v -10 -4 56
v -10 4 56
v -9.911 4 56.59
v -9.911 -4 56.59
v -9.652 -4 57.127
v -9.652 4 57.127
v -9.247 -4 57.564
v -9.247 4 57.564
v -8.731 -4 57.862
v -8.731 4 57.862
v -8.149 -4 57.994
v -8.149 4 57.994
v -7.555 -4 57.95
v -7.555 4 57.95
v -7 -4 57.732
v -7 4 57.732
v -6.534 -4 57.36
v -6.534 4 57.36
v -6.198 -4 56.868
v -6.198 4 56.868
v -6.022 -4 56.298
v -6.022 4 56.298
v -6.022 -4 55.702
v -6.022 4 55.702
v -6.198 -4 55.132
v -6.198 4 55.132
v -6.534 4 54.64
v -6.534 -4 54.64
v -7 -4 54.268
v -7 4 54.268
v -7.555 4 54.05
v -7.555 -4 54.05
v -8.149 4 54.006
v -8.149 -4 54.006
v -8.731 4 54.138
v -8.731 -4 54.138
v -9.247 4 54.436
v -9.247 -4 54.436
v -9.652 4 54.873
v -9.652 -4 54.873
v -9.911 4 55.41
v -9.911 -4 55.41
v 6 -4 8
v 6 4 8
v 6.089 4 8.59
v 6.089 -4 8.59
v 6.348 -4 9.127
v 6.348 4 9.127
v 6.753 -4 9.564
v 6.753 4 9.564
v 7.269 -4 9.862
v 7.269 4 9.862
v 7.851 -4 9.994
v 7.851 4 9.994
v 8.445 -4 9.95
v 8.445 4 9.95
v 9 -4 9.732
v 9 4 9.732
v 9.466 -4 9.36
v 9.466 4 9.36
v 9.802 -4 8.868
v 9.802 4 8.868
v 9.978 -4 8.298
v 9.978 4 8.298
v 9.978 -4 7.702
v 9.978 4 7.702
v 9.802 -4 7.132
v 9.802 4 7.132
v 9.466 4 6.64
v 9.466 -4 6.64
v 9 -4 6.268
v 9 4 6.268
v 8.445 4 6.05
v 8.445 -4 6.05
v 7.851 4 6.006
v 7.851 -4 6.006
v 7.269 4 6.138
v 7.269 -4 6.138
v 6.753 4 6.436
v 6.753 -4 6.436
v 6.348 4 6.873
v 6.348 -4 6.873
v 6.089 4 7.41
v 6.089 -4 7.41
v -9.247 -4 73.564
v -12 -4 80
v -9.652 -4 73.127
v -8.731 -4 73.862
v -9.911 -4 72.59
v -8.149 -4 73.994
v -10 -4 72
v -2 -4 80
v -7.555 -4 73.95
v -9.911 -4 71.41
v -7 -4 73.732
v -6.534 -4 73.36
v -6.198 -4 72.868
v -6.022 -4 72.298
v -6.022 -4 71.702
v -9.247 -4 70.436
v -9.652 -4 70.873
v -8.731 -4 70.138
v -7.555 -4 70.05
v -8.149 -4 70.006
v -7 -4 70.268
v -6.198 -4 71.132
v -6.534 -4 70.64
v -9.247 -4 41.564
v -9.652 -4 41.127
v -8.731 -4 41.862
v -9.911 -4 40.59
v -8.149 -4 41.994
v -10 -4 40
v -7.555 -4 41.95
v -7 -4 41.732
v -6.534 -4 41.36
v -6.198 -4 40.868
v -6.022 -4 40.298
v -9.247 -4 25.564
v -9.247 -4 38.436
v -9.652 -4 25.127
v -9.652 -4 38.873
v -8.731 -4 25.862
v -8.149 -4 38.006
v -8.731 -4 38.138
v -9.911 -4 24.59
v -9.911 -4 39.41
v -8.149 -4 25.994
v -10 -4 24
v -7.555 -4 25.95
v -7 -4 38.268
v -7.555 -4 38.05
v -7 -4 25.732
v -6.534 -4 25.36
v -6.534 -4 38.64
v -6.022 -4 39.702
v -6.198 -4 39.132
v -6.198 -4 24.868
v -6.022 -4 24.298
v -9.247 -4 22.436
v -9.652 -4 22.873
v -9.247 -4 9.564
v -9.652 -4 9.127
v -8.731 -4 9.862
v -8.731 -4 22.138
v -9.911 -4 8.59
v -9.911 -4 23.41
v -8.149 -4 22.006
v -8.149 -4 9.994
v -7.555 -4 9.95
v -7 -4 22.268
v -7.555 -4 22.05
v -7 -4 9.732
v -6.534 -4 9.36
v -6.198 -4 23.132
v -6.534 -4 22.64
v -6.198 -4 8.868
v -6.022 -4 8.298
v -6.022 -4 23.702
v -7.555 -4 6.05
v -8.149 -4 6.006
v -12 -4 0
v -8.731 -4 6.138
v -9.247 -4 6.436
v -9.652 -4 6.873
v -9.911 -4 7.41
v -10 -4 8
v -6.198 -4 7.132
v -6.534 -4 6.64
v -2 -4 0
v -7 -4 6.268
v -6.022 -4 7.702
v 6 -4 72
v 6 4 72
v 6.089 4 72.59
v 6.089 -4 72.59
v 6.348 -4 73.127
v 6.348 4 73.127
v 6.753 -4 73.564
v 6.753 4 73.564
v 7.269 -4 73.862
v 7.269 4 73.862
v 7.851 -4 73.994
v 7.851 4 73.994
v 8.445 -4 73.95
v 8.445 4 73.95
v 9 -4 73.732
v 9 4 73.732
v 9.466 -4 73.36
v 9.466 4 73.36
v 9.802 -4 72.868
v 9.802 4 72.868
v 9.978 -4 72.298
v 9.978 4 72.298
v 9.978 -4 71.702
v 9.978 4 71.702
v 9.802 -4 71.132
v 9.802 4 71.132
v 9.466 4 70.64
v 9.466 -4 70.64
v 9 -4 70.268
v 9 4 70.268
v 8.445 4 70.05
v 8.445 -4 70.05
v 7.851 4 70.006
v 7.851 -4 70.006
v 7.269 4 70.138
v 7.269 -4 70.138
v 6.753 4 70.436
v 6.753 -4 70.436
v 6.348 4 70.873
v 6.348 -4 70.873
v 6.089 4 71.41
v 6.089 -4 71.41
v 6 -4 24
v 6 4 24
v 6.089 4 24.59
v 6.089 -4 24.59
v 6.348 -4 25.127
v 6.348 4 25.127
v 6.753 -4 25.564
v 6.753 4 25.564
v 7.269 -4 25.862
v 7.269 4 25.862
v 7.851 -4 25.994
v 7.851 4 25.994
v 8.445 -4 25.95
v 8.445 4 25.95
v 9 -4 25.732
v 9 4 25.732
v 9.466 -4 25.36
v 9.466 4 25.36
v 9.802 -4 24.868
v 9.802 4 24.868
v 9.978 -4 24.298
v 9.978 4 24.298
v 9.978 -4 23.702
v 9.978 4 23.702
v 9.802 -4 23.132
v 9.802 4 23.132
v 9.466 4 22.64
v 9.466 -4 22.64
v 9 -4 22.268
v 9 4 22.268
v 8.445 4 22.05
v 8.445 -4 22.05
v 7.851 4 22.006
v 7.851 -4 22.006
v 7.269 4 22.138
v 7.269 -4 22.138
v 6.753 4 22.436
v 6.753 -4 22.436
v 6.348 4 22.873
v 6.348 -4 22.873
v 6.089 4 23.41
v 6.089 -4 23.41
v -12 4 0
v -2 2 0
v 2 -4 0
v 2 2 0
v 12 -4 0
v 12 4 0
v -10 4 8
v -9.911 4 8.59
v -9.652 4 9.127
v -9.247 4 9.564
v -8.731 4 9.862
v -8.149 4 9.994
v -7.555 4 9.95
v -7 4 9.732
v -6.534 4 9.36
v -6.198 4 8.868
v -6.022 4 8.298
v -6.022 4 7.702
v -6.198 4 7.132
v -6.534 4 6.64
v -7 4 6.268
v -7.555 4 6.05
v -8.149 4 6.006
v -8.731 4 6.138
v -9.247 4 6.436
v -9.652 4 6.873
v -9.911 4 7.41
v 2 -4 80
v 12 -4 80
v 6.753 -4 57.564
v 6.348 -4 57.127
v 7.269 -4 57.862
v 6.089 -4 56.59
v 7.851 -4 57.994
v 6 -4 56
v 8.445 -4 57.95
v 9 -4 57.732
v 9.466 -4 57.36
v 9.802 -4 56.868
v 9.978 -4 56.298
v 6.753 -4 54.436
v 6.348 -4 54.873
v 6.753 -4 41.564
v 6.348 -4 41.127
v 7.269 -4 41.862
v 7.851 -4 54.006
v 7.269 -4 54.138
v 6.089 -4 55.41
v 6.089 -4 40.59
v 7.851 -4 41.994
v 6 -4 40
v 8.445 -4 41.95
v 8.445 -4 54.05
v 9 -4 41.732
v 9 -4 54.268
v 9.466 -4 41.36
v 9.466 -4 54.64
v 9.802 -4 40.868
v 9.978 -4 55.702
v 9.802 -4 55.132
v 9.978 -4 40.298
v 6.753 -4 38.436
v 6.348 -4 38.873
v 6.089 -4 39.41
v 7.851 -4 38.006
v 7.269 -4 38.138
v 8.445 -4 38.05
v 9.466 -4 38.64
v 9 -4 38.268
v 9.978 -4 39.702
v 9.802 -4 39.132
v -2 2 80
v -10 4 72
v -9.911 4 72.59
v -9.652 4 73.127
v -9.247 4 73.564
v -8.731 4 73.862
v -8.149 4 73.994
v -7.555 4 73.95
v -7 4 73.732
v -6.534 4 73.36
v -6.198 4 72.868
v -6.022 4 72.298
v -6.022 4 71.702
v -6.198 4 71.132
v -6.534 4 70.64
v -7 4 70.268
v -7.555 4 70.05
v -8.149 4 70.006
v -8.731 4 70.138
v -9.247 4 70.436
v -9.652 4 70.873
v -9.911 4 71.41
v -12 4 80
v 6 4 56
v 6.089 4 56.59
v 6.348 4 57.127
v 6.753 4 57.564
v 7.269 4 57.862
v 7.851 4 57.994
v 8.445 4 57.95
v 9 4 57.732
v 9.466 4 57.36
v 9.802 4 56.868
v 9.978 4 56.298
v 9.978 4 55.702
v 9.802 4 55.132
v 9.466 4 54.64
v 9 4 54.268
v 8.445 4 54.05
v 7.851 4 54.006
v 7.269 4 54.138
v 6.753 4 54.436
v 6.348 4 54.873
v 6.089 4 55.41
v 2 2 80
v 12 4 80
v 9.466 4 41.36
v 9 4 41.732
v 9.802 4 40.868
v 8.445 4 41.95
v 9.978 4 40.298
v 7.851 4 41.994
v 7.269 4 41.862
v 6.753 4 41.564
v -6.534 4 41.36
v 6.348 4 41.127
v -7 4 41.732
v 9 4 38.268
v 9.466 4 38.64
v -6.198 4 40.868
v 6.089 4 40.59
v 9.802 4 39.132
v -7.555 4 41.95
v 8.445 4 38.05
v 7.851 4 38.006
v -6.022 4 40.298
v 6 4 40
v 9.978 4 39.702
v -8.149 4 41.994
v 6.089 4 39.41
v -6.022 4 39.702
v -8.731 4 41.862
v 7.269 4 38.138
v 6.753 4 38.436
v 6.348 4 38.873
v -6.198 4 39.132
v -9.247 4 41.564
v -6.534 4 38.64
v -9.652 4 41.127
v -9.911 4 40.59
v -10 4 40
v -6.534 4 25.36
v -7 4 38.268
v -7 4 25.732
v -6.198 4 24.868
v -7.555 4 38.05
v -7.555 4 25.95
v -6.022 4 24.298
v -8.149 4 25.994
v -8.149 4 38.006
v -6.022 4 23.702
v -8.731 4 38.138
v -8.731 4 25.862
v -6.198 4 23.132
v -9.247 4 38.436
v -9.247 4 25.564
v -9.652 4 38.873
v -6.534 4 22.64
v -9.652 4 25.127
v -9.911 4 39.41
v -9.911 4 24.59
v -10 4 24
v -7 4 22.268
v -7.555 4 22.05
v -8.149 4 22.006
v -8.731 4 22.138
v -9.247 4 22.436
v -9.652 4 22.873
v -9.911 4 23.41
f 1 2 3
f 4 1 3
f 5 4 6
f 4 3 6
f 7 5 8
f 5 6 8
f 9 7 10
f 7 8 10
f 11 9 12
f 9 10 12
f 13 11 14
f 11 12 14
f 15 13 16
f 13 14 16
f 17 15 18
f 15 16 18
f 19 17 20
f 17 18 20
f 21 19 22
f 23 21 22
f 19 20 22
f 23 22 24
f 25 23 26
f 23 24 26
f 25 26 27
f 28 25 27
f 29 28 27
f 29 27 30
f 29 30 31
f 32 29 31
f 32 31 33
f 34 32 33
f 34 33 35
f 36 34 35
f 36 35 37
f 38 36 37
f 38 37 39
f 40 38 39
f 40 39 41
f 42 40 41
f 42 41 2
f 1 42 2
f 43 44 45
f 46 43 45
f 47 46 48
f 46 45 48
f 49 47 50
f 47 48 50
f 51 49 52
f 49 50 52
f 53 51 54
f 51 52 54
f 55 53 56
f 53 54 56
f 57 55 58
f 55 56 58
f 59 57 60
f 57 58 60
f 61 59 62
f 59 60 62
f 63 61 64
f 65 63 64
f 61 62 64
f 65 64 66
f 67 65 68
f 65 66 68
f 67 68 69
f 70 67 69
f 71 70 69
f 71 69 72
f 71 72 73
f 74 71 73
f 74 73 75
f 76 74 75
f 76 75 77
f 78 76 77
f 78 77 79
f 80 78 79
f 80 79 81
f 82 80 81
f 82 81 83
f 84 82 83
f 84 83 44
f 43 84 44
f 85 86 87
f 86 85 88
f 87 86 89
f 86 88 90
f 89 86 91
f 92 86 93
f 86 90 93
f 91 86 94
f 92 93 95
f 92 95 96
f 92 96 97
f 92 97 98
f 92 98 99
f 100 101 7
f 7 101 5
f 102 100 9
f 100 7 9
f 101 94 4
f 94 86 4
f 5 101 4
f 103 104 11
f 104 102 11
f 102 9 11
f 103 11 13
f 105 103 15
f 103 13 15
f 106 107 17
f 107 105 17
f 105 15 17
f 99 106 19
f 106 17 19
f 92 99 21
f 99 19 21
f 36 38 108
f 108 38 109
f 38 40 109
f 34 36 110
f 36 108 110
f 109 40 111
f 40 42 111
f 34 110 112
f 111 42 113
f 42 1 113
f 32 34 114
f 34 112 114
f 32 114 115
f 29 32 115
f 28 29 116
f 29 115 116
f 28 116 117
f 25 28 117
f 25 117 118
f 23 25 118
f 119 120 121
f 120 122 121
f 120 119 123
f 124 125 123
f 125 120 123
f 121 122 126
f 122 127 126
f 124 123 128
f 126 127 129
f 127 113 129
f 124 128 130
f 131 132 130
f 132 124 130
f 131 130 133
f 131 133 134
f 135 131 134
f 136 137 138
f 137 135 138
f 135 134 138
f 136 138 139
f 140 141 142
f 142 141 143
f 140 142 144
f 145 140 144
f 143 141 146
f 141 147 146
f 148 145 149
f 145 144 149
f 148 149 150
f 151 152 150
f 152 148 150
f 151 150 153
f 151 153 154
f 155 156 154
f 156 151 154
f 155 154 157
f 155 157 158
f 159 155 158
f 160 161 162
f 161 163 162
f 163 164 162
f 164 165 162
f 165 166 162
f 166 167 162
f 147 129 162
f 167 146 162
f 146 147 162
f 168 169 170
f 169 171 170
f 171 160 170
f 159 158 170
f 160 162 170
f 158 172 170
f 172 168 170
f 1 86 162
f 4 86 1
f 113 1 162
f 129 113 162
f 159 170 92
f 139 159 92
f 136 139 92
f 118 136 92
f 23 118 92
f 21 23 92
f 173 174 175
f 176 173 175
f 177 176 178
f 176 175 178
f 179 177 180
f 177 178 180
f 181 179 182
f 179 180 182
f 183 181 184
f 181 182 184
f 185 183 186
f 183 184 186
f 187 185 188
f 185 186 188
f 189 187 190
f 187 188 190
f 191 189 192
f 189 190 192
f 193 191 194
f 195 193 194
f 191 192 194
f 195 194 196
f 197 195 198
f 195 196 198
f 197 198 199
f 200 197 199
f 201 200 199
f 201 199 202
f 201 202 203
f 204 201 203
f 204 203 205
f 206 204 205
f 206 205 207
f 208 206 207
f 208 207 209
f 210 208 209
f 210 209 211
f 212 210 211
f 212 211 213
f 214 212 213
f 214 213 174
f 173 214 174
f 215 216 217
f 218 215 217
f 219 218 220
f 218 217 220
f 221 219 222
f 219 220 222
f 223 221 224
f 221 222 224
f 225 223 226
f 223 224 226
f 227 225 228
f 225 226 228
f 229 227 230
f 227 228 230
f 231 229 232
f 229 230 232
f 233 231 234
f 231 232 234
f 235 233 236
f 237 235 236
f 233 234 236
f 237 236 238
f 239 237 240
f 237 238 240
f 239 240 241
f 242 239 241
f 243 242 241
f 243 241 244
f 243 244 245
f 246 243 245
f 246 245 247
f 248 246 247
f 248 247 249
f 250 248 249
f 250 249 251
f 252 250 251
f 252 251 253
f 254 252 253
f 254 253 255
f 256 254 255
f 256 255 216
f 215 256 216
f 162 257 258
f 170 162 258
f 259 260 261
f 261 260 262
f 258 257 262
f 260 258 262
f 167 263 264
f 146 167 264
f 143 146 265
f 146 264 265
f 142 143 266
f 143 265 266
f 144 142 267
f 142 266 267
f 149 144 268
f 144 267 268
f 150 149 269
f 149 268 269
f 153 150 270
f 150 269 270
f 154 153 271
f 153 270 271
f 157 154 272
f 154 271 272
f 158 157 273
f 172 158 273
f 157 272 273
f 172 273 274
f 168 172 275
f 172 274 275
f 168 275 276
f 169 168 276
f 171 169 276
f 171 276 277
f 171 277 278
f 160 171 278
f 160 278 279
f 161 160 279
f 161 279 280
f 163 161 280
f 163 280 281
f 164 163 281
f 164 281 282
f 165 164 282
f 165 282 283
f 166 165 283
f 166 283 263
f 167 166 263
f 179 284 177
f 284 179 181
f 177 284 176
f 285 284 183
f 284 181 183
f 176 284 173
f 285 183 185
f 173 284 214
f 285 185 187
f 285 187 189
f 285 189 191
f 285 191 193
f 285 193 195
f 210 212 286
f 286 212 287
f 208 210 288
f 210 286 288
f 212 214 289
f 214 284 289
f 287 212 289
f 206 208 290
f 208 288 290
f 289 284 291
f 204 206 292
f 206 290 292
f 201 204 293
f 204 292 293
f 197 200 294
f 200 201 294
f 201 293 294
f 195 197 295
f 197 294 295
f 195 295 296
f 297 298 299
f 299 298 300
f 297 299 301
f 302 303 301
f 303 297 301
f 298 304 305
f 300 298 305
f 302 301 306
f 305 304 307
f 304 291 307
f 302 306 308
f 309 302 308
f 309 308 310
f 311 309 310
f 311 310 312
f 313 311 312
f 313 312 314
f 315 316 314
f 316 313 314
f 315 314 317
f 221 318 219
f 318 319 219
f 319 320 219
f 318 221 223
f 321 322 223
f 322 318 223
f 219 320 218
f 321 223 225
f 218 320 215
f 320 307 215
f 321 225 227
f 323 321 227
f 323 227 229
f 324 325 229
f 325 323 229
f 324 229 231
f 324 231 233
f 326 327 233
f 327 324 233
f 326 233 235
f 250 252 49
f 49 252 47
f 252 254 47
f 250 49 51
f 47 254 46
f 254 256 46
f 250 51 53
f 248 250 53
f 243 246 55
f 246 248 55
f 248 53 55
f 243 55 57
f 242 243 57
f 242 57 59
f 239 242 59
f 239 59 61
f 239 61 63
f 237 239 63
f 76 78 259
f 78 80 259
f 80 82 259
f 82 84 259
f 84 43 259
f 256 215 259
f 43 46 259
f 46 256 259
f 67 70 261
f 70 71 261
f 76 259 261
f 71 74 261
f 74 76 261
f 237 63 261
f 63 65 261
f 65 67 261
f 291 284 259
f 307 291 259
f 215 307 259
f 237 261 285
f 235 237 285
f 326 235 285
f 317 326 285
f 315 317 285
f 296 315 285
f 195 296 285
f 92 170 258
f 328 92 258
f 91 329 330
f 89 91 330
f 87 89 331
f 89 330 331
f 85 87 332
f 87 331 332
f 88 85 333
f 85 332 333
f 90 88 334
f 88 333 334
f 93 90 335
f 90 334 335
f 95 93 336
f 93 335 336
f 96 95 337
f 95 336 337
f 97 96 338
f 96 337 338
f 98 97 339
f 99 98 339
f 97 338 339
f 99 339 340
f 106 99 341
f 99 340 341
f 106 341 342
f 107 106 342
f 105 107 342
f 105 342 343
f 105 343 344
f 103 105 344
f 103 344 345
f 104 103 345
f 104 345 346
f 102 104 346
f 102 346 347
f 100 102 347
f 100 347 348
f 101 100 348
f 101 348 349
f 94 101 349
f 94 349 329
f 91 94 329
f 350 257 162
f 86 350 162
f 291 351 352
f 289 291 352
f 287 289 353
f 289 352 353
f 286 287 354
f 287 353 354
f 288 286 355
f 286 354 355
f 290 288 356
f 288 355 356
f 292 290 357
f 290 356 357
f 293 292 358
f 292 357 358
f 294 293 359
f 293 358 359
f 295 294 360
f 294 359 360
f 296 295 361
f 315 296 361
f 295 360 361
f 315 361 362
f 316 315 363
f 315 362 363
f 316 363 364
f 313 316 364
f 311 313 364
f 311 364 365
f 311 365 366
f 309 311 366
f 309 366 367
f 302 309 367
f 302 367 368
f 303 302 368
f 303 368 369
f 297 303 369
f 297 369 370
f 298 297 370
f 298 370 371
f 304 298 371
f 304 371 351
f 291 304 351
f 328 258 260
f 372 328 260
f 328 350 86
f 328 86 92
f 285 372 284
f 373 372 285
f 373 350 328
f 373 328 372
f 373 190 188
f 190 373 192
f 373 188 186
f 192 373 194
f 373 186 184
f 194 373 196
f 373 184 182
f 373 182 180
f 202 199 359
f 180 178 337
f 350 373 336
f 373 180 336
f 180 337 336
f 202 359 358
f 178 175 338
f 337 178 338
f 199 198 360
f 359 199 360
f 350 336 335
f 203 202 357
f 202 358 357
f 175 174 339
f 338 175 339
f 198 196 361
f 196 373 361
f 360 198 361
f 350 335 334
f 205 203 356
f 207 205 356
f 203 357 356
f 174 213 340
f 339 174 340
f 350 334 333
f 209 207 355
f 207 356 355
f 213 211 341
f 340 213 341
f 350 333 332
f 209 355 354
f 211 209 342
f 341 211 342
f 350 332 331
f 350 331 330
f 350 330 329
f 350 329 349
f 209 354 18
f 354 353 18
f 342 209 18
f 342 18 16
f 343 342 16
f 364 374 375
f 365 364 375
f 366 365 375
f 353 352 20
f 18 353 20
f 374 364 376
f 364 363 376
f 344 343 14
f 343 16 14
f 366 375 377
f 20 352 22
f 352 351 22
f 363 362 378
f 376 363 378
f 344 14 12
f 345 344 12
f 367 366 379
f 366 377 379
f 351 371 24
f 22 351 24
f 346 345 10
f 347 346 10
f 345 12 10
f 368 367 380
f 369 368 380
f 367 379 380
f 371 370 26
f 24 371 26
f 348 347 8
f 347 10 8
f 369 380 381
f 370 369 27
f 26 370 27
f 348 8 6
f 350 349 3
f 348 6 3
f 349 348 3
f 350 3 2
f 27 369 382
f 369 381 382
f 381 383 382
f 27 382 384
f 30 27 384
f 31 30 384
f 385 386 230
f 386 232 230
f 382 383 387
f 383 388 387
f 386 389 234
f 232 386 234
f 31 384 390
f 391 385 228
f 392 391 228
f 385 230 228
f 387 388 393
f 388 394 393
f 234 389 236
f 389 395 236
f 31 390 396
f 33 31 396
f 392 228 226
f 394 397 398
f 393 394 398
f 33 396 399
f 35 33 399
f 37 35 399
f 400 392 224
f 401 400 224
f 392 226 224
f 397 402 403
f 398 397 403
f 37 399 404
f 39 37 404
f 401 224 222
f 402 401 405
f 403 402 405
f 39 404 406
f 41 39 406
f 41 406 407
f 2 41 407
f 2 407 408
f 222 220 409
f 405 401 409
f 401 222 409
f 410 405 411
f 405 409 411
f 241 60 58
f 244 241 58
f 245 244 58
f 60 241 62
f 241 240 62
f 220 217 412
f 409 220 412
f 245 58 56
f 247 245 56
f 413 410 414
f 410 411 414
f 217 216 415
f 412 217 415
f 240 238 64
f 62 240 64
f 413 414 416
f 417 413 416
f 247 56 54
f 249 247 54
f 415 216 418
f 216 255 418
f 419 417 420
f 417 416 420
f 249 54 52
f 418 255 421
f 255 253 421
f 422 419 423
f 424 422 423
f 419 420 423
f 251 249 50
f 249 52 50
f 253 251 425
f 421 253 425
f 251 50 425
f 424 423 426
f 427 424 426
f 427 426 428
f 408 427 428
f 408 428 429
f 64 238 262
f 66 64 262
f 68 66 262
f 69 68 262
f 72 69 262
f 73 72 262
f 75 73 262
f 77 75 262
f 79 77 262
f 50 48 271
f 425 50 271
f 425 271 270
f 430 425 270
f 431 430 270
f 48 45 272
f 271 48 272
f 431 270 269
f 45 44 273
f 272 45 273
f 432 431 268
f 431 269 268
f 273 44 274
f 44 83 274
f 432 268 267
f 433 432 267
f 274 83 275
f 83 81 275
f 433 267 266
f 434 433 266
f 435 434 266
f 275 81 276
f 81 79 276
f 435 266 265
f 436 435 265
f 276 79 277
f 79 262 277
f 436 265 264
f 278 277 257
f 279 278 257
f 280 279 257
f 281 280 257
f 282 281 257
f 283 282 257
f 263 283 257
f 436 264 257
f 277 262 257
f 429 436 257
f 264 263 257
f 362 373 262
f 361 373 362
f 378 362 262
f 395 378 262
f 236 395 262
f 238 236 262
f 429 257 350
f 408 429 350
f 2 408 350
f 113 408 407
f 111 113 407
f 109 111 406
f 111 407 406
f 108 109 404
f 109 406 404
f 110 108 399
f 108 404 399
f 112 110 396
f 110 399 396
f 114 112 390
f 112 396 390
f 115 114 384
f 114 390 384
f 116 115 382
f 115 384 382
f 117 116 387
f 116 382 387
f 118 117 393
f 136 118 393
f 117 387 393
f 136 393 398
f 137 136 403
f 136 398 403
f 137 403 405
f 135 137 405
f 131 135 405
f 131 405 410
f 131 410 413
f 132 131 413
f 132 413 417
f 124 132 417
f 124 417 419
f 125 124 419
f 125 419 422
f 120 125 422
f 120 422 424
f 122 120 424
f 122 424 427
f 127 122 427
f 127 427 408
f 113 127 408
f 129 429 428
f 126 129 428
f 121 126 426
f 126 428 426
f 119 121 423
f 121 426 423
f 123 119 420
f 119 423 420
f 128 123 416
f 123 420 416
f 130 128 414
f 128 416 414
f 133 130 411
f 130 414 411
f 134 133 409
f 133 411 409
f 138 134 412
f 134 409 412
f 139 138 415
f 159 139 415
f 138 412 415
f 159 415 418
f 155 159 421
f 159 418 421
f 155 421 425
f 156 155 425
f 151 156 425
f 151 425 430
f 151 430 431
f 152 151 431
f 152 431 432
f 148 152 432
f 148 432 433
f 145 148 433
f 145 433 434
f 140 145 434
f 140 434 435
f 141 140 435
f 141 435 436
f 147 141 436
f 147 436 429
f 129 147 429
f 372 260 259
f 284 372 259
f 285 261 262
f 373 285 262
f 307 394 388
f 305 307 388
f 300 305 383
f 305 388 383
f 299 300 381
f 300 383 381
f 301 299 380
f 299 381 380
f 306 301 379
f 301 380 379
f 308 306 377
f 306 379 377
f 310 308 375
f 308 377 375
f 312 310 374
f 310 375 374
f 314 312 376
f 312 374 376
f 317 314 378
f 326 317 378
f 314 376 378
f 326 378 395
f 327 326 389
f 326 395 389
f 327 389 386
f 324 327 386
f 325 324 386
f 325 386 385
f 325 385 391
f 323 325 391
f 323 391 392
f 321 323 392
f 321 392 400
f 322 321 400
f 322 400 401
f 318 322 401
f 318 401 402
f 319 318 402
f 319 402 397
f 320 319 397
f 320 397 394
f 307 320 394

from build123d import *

# Parameters (mm, degrees)
F1_DEPTH = 80
F2_R     = 2
F3_DEPTH = 25


with BuildPart() as f1:
    # F0 (on Top) → F1 (new body)
    with BuildSketch(Plane.XY):
        Polygon((12, -4), (12, 4), (-12, 4), (-12, -4), (-2, -4), (-2, 2), (2, 2), (2, -4), align=None)
    extrude(amount=F1_DEPTH)

    # F2 (on face) → F3 (cut)
    with BuildSketch(Plane(origin=(0, 4, 0), x_dir=(-1, 0, 0), z_dir=(0, 1, 0))):
        with Locations((-8, 8)):
            Circle(F2_R)
        with Locations((-8, 24)):
            Circle(F2_R)
        with Locations((-8, 40)):
            Circle(F2_R)
        with Locations((-8, 56)):
            Circle(F2_R)
        with Locations((-8, 72)):
            Circle(F2_R)
        with Locations((8, 8)):
            Circle(F2_R)
        with Locations((8, 24)):
            Circle(F2_R)
        with Locations((8, 40)):
            Circle(F2_R)
        with Locations((8, 56)):
            Circle(F2_R)
        with Locations((8, 72)):
            Circle(F2_R)
        with Locations((-8, 88)):
            Circle(F2_R)
        with Locations((-8, 104)):
            Circle(F2_R)
        with Locations((-8, 120)):
            Circle(F2_R)
        with Locations((-8, 136)):
            Circle(F2_R)
        with Locations((-8, 152)):
            Circle(F2_R)
        with Locations((8, 88)):
            Circle(F2_R)
        with Locations((8, 104)):
            Circle(F2_R)
        with Locations((8, 120)):
            Circle(F2_R)
        with Locations((8, 136)):
            Circle(F2_R)
        with Locations((8, 152)):
            Circle(F2_R)
    extrude(amount=-F3_DEPTH, mode=Mode.SUBTRACT)


solid = f1.part
